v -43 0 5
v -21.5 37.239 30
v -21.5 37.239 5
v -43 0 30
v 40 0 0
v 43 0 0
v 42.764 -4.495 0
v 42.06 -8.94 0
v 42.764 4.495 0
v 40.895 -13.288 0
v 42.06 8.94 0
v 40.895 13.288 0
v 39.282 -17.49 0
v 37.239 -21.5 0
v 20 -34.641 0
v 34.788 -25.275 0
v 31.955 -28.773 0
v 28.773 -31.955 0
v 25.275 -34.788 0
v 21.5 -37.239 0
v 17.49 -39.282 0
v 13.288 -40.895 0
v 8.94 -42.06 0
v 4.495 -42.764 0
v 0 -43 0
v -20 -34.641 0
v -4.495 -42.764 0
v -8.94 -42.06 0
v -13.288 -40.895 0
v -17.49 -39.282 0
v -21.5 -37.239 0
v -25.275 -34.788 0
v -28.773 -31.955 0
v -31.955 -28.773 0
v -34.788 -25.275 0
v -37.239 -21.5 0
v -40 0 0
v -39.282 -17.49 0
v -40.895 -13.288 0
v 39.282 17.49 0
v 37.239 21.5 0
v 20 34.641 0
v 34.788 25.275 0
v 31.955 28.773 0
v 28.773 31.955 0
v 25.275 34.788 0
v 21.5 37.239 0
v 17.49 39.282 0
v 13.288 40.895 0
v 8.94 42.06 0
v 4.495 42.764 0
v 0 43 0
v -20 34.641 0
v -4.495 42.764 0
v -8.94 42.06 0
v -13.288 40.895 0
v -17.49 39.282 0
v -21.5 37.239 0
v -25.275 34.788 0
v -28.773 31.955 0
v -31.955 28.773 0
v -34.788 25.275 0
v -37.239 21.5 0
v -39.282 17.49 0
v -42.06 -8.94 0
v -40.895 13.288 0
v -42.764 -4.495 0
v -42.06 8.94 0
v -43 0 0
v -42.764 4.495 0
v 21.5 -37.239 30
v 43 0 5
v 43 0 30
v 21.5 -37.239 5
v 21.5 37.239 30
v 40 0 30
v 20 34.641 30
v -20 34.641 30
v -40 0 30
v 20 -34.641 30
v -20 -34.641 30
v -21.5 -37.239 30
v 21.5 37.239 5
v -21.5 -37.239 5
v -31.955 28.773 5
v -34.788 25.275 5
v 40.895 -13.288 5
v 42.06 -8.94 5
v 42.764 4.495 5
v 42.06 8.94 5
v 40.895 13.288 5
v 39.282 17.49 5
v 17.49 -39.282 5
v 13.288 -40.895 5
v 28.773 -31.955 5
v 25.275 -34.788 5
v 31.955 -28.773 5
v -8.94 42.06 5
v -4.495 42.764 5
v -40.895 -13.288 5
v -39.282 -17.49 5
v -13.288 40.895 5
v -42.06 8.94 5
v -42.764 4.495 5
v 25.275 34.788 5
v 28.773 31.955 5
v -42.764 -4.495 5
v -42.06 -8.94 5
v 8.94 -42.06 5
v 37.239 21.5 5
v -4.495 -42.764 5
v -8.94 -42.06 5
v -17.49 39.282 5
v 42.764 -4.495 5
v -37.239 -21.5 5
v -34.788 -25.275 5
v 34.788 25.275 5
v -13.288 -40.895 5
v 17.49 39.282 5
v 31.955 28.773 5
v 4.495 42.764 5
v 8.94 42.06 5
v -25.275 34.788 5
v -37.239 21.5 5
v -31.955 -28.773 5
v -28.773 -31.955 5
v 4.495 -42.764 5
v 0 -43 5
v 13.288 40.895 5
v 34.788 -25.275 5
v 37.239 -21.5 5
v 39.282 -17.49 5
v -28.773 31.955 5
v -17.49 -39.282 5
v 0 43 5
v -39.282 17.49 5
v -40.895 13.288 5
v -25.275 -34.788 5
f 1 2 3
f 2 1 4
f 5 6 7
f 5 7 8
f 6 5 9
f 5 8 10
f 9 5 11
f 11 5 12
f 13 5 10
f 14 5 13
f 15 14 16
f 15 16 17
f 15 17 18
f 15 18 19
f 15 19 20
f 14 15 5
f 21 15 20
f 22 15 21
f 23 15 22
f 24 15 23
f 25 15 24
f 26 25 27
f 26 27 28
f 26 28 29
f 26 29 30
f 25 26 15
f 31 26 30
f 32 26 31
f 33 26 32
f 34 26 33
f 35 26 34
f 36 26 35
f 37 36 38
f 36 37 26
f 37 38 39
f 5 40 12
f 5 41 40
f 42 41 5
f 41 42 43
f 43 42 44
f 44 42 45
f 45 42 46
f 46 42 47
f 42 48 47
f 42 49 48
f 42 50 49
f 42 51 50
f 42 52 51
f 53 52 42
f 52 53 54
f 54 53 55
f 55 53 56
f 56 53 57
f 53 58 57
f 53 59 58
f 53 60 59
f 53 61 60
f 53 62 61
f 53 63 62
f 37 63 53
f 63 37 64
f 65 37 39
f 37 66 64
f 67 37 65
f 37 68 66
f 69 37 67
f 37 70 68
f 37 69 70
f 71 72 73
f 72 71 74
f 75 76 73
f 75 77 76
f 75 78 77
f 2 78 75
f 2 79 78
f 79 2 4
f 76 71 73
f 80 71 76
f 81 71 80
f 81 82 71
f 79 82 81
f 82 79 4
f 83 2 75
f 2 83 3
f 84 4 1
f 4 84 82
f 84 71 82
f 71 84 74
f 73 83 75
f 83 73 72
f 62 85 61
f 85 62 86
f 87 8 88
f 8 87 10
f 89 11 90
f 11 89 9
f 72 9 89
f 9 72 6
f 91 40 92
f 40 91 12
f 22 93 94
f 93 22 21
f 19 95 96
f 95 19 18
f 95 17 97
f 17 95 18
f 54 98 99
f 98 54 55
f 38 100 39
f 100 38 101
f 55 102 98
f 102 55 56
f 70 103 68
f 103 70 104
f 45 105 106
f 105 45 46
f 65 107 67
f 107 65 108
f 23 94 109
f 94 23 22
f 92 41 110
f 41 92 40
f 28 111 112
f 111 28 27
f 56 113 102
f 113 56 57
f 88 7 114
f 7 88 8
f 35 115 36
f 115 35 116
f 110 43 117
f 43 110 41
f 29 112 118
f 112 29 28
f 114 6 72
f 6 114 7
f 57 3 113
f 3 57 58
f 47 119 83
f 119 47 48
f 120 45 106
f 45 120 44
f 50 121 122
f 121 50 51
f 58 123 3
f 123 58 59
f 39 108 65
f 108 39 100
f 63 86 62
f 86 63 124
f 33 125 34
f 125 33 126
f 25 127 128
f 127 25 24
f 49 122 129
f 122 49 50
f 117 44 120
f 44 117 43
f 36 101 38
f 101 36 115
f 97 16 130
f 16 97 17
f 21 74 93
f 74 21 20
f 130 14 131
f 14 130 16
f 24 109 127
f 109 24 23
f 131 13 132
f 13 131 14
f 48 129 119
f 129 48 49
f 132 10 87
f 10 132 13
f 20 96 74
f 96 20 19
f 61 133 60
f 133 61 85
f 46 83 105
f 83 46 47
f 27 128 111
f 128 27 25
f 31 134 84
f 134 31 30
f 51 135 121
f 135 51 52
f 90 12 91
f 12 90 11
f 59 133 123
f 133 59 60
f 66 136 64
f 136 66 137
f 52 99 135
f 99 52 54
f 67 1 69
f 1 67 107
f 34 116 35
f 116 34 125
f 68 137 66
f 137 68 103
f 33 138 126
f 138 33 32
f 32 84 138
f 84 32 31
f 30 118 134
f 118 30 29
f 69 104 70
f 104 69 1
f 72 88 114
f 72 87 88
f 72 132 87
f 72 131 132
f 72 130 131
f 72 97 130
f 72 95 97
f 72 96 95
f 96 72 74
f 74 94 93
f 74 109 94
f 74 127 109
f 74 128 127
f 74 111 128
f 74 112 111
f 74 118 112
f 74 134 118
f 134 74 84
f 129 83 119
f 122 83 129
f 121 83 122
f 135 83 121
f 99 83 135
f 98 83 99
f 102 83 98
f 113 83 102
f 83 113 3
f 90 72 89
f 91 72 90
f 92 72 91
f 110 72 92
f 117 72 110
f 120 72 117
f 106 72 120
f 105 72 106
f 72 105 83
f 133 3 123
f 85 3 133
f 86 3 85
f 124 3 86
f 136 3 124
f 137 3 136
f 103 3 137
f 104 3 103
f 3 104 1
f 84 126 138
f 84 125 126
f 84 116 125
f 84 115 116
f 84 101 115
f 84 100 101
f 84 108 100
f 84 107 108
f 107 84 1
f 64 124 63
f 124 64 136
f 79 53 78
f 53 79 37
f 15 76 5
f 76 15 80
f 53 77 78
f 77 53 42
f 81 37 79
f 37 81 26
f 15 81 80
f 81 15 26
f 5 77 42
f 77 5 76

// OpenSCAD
//Polygon sides
polysides=6; // [5:20]

//Height of cutter
cutterheight=30; // [5:50]

//Radius of inner cutter
cutterradius = 40;// [5:100]

//Wall thickness
wallthick = 3; // [1:10]

//Base height
baseheight = 5; // [0:10]

/* [Hidden] */
$fn=60;
cutterradius_o = cutterradius+wallthick;

difference() {
	union() {
			
		linear_extrude(height=cutterheight) circle(r=cutterradius_o,$fn=polysides);
			
		cylinder(h=baseheight,r=cutterradius_o);
	}

translate([0,0,-10]) linear_extrude(height=cutterheight+20) circle(r=cutterradius,$fn=polysides);

}
